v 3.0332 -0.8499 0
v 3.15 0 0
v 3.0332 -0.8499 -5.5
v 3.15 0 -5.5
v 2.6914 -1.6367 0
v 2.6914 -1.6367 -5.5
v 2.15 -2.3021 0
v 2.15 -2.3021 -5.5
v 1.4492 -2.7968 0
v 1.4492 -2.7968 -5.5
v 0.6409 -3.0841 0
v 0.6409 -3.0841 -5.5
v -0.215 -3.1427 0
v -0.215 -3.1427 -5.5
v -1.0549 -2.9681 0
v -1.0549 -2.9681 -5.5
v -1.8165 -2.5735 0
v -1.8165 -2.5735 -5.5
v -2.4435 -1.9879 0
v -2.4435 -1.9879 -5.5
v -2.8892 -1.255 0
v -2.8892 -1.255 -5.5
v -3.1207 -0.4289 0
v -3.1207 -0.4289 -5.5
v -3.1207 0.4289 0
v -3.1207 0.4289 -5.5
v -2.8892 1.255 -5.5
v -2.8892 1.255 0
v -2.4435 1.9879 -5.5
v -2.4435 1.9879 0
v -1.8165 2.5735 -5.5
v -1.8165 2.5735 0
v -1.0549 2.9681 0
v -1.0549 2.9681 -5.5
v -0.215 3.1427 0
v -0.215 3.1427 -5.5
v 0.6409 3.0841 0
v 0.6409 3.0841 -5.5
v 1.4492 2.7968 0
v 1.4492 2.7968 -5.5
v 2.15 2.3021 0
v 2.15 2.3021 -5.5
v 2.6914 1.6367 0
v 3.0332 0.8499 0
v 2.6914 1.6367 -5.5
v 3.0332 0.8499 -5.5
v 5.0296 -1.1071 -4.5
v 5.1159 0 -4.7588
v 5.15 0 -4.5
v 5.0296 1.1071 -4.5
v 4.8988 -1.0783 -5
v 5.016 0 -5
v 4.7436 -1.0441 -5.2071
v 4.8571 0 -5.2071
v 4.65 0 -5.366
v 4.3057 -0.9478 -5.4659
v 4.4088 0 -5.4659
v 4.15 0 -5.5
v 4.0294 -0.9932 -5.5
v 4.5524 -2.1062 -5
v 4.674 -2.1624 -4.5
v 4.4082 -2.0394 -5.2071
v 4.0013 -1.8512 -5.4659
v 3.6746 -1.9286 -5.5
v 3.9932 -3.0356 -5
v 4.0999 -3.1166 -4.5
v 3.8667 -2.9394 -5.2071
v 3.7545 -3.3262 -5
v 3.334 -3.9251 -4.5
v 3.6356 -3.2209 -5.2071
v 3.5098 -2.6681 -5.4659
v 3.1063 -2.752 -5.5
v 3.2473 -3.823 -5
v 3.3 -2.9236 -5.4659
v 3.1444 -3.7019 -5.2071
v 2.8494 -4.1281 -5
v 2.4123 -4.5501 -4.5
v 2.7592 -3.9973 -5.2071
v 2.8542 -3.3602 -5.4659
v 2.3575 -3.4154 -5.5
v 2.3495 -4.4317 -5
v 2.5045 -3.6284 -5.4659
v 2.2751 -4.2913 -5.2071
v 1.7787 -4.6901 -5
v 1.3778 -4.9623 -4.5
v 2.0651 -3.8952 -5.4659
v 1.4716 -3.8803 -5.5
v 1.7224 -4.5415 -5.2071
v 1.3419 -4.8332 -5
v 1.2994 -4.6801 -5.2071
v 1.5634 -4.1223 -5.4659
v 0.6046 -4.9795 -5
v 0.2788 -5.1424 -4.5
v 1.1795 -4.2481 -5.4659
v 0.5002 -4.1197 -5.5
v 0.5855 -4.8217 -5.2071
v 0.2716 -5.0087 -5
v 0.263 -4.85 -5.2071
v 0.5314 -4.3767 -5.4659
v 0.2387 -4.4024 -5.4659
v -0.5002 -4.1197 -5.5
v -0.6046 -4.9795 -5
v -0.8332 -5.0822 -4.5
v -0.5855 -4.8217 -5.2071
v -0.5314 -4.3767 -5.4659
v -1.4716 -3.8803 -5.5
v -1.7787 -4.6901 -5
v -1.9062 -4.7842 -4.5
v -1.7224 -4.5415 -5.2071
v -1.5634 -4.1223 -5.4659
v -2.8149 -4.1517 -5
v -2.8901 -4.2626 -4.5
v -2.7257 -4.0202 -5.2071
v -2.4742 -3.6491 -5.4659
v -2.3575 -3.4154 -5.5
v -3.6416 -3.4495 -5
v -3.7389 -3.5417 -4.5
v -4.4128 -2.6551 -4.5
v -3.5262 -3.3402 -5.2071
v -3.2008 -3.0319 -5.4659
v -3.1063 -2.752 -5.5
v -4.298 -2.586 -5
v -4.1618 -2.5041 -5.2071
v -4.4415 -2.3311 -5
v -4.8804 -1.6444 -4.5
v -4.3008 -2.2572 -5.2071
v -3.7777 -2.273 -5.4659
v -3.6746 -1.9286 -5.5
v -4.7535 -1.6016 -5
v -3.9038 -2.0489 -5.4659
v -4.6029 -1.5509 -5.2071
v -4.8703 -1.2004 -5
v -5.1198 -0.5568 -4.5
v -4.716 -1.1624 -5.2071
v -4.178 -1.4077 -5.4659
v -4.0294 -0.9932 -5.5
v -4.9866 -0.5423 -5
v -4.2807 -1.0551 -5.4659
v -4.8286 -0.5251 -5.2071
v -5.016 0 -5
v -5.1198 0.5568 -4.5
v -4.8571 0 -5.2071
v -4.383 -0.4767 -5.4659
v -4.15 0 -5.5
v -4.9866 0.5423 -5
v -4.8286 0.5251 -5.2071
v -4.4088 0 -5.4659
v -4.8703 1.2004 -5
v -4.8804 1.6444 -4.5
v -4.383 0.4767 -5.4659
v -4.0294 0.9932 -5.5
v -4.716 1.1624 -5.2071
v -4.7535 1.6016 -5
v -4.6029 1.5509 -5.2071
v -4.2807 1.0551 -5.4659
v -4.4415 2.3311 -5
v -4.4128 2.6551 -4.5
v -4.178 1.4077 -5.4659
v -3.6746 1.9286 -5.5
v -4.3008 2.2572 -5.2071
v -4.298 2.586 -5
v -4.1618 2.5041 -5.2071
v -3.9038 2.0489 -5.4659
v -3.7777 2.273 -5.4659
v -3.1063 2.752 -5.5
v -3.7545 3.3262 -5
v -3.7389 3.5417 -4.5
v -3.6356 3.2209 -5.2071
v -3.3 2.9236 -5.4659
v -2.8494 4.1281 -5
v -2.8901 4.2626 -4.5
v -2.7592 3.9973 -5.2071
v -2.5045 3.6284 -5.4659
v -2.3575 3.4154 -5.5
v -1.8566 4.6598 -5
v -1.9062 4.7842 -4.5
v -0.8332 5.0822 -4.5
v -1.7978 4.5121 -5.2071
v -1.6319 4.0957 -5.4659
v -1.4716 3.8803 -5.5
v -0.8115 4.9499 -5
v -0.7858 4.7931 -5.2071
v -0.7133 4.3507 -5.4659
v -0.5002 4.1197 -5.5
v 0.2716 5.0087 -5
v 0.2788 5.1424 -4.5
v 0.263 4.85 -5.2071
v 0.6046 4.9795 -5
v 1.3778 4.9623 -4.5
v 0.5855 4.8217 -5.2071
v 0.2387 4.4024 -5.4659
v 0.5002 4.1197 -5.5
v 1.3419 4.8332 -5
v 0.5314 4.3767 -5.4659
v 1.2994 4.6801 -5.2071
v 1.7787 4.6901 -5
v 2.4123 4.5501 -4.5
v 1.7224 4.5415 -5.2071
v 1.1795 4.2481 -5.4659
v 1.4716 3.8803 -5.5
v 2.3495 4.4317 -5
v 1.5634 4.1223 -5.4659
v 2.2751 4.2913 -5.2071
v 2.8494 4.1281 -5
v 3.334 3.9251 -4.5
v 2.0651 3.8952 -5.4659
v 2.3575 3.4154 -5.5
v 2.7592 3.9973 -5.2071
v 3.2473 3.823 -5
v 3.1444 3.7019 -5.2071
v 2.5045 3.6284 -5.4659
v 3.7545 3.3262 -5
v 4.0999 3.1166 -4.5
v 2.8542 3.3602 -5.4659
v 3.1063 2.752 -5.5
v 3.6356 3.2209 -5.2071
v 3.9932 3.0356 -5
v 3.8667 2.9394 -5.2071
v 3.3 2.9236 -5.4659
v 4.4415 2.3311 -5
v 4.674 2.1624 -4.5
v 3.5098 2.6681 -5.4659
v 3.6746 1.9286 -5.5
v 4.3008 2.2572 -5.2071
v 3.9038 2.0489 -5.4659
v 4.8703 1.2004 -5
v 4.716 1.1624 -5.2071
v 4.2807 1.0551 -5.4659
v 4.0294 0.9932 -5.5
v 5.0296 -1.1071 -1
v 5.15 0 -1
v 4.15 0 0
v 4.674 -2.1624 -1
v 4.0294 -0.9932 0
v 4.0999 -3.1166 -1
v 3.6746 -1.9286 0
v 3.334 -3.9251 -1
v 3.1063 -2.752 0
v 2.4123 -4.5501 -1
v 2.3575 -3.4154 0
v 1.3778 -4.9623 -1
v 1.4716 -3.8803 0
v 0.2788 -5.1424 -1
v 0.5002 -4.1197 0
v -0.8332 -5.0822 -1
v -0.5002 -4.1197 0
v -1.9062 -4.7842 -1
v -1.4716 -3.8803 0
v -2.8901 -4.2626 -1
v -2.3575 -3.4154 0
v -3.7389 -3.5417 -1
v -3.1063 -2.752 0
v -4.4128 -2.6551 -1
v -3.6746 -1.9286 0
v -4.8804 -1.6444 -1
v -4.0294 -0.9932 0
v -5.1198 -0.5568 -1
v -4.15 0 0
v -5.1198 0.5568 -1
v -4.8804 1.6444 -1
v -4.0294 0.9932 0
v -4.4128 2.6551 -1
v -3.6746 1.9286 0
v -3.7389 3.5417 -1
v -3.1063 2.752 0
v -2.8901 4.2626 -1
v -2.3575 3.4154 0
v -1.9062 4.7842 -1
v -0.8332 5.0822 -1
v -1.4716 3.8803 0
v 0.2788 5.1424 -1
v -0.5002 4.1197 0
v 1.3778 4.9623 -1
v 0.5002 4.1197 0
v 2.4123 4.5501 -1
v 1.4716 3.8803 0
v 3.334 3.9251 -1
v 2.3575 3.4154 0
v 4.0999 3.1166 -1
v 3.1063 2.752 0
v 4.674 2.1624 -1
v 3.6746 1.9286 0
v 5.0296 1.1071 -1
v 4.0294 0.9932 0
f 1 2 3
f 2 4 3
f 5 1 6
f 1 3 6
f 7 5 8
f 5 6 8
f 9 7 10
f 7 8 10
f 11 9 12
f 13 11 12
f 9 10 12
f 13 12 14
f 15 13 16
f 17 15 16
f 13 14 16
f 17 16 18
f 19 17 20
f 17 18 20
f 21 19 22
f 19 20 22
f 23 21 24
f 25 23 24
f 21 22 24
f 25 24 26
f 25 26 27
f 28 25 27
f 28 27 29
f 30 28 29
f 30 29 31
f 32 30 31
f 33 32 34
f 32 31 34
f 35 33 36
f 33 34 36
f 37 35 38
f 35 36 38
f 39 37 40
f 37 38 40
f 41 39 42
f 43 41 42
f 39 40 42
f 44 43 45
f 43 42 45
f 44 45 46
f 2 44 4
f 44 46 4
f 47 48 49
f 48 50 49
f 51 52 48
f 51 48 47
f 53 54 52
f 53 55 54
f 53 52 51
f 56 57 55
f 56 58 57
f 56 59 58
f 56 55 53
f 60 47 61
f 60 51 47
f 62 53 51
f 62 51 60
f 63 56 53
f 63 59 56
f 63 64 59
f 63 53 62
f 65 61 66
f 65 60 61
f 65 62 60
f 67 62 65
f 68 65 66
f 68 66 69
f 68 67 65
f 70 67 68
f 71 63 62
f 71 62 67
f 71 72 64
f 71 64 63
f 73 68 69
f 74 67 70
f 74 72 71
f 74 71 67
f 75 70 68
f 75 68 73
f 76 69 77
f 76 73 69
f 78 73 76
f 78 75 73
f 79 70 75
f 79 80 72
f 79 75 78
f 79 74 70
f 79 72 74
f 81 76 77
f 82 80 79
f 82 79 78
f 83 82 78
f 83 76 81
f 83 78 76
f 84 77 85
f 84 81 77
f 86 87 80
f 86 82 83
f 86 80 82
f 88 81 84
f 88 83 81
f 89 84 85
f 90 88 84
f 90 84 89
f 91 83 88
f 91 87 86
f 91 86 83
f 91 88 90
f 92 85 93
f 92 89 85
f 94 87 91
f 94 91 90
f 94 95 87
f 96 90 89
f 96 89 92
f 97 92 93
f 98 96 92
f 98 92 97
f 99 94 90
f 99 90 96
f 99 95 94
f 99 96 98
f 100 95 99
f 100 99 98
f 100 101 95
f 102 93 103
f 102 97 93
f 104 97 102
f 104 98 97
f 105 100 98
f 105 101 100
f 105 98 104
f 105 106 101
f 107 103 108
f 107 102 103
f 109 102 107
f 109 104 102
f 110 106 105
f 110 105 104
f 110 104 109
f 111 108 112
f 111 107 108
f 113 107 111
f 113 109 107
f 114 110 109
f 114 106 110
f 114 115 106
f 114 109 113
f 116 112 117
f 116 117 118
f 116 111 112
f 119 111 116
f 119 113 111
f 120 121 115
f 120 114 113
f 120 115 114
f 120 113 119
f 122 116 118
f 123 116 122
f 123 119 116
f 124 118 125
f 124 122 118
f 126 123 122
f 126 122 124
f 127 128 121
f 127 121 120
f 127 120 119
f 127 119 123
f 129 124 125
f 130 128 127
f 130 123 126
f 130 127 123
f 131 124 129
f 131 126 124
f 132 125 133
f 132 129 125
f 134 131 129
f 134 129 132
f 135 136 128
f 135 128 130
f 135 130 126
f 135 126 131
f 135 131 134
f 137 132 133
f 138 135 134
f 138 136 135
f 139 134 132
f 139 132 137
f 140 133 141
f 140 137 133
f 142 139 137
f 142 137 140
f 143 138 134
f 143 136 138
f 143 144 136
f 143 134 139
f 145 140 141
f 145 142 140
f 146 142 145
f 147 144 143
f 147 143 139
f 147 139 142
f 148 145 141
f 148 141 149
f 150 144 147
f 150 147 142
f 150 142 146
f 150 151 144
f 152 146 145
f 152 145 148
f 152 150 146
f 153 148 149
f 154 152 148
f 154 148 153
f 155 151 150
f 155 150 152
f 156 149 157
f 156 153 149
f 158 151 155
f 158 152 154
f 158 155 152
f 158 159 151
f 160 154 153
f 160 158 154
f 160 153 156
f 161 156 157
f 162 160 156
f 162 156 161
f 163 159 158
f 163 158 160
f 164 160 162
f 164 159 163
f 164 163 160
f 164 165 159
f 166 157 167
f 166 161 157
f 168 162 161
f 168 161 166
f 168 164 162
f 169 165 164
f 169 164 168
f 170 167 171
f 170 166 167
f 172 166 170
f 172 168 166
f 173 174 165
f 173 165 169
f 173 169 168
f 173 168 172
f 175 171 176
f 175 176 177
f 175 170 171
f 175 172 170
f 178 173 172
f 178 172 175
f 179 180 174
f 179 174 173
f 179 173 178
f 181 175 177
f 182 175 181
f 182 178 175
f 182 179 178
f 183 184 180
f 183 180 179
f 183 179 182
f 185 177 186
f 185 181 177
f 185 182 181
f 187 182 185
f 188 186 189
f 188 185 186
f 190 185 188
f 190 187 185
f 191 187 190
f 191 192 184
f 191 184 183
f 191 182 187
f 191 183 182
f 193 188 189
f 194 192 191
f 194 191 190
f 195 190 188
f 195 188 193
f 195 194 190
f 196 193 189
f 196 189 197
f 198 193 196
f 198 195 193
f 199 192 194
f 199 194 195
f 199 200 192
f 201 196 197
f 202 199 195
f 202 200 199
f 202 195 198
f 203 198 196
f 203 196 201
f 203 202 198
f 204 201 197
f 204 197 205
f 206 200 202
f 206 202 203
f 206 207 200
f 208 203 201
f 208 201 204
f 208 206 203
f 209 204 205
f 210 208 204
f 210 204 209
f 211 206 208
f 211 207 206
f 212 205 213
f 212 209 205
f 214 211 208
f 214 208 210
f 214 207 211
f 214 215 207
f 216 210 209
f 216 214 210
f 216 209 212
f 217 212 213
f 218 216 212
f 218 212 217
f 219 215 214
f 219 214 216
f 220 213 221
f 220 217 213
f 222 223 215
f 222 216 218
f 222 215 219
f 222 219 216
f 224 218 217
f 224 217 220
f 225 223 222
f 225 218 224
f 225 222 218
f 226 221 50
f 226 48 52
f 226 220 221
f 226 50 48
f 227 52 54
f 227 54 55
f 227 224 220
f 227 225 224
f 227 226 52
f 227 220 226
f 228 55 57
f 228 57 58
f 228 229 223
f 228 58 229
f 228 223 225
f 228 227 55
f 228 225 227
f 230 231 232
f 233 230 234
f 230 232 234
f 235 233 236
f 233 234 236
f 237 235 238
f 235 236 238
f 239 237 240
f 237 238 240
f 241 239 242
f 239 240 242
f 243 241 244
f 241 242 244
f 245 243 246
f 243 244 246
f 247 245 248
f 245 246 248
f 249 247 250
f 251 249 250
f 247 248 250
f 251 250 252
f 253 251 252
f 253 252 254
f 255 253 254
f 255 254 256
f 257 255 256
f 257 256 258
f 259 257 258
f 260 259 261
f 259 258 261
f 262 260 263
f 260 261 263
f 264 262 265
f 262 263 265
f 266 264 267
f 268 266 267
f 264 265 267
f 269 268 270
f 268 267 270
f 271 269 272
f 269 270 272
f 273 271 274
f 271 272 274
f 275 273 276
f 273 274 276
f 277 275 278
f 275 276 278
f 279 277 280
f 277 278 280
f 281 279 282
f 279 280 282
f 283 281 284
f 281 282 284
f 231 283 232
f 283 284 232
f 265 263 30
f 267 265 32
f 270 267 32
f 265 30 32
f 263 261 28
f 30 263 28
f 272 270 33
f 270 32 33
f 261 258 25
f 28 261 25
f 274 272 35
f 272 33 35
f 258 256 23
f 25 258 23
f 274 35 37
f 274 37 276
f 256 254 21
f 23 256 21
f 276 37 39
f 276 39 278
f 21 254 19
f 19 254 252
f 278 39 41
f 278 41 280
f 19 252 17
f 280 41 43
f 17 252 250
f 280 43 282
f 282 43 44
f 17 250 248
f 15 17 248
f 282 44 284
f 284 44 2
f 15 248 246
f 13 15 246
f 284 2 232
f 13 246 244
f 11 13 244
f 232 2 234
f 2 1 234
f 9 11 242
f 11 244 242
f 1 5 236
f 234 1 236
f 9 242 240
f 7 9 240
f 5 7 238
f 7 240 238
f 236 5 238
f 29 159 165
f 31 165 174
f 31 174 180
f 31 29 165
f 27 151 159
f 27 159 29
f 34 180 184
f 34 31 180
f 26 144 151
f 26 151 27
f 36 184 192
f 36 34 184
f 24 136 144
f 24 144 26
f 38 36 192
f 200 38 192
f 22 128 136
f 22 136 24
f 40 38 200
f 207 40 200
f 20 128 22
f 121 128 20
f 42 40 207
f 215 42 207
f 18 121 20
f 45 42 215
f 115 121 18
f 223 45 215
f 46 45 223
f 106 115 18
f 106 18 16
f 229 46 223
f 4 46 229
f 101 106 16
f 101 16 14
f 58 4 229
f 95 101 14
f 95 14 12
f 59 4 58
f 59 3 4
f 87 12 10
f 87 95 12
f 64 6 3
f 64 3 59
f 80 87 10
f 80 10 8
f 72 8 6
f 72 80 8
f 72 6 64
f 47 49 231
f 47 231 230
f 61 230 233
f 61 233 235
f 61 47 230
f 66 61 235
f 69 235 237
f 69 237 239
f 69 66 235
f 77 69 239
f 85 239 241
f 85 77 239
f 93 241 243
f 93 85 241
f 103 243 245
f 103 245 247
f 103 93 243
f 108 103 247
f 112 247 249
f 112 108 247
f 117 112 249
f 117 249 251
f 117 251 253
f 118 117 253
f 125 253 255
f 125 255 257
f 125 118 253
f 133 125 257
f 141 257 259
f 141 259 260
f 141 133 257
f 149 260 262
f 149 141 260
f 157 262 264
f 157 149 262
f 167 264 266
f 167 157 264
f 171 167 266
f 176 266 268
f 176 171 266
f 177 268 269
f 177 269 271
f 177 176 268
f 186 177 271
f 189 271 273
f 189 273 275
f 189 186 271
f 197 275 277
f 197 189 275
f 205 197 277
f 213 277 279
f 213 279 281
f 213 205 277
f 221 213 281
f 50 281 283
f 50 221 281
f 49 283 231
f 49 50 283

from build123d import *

# Parameters (mm, degrees)
SKETCH1_W     = 2
SKETCH1_H     = 5.5
CHAMFER1_SIZE = 1
FILLET1_R     = 1


with BuildPart() as part:
    # Sketch1 → Revolve1 (revolve)
    with BuildSketch(Plane(origin=(0, 0, 0), x_dir=(1, 0, 0), z_dir=(0, 1, 0)), mode=Mode.PRIVATE) as revolve1_sk:
        with Locations((-4.15, 2.75)):
            Rectangle(SKETCH1_W, SKETCH1_H)
    revolve(revolve1_sk.sketch.rotate(Axis((0, 0, 0), (0, 0, -1)), 180), axis=Axis((0, 0, 0), (0, 0, -1)))

    # Chamfer1
    chamfer1_edges = [part.edges().sort_by_distance(p)[0] for p in [
        (-5.15, 0, 0),
    ]]
    chamfer(chamfer1_edges, length=CHAMFER1_SIZE)

    # Fillet1
    fillet1_edges = [part.edges().sort_by_distance(p)[0] for p in [
        (-5.15, 0, -5.5),
    ]]
    fillet(fillet1_edges, radius=FILLET1_R)


solid = part.part
